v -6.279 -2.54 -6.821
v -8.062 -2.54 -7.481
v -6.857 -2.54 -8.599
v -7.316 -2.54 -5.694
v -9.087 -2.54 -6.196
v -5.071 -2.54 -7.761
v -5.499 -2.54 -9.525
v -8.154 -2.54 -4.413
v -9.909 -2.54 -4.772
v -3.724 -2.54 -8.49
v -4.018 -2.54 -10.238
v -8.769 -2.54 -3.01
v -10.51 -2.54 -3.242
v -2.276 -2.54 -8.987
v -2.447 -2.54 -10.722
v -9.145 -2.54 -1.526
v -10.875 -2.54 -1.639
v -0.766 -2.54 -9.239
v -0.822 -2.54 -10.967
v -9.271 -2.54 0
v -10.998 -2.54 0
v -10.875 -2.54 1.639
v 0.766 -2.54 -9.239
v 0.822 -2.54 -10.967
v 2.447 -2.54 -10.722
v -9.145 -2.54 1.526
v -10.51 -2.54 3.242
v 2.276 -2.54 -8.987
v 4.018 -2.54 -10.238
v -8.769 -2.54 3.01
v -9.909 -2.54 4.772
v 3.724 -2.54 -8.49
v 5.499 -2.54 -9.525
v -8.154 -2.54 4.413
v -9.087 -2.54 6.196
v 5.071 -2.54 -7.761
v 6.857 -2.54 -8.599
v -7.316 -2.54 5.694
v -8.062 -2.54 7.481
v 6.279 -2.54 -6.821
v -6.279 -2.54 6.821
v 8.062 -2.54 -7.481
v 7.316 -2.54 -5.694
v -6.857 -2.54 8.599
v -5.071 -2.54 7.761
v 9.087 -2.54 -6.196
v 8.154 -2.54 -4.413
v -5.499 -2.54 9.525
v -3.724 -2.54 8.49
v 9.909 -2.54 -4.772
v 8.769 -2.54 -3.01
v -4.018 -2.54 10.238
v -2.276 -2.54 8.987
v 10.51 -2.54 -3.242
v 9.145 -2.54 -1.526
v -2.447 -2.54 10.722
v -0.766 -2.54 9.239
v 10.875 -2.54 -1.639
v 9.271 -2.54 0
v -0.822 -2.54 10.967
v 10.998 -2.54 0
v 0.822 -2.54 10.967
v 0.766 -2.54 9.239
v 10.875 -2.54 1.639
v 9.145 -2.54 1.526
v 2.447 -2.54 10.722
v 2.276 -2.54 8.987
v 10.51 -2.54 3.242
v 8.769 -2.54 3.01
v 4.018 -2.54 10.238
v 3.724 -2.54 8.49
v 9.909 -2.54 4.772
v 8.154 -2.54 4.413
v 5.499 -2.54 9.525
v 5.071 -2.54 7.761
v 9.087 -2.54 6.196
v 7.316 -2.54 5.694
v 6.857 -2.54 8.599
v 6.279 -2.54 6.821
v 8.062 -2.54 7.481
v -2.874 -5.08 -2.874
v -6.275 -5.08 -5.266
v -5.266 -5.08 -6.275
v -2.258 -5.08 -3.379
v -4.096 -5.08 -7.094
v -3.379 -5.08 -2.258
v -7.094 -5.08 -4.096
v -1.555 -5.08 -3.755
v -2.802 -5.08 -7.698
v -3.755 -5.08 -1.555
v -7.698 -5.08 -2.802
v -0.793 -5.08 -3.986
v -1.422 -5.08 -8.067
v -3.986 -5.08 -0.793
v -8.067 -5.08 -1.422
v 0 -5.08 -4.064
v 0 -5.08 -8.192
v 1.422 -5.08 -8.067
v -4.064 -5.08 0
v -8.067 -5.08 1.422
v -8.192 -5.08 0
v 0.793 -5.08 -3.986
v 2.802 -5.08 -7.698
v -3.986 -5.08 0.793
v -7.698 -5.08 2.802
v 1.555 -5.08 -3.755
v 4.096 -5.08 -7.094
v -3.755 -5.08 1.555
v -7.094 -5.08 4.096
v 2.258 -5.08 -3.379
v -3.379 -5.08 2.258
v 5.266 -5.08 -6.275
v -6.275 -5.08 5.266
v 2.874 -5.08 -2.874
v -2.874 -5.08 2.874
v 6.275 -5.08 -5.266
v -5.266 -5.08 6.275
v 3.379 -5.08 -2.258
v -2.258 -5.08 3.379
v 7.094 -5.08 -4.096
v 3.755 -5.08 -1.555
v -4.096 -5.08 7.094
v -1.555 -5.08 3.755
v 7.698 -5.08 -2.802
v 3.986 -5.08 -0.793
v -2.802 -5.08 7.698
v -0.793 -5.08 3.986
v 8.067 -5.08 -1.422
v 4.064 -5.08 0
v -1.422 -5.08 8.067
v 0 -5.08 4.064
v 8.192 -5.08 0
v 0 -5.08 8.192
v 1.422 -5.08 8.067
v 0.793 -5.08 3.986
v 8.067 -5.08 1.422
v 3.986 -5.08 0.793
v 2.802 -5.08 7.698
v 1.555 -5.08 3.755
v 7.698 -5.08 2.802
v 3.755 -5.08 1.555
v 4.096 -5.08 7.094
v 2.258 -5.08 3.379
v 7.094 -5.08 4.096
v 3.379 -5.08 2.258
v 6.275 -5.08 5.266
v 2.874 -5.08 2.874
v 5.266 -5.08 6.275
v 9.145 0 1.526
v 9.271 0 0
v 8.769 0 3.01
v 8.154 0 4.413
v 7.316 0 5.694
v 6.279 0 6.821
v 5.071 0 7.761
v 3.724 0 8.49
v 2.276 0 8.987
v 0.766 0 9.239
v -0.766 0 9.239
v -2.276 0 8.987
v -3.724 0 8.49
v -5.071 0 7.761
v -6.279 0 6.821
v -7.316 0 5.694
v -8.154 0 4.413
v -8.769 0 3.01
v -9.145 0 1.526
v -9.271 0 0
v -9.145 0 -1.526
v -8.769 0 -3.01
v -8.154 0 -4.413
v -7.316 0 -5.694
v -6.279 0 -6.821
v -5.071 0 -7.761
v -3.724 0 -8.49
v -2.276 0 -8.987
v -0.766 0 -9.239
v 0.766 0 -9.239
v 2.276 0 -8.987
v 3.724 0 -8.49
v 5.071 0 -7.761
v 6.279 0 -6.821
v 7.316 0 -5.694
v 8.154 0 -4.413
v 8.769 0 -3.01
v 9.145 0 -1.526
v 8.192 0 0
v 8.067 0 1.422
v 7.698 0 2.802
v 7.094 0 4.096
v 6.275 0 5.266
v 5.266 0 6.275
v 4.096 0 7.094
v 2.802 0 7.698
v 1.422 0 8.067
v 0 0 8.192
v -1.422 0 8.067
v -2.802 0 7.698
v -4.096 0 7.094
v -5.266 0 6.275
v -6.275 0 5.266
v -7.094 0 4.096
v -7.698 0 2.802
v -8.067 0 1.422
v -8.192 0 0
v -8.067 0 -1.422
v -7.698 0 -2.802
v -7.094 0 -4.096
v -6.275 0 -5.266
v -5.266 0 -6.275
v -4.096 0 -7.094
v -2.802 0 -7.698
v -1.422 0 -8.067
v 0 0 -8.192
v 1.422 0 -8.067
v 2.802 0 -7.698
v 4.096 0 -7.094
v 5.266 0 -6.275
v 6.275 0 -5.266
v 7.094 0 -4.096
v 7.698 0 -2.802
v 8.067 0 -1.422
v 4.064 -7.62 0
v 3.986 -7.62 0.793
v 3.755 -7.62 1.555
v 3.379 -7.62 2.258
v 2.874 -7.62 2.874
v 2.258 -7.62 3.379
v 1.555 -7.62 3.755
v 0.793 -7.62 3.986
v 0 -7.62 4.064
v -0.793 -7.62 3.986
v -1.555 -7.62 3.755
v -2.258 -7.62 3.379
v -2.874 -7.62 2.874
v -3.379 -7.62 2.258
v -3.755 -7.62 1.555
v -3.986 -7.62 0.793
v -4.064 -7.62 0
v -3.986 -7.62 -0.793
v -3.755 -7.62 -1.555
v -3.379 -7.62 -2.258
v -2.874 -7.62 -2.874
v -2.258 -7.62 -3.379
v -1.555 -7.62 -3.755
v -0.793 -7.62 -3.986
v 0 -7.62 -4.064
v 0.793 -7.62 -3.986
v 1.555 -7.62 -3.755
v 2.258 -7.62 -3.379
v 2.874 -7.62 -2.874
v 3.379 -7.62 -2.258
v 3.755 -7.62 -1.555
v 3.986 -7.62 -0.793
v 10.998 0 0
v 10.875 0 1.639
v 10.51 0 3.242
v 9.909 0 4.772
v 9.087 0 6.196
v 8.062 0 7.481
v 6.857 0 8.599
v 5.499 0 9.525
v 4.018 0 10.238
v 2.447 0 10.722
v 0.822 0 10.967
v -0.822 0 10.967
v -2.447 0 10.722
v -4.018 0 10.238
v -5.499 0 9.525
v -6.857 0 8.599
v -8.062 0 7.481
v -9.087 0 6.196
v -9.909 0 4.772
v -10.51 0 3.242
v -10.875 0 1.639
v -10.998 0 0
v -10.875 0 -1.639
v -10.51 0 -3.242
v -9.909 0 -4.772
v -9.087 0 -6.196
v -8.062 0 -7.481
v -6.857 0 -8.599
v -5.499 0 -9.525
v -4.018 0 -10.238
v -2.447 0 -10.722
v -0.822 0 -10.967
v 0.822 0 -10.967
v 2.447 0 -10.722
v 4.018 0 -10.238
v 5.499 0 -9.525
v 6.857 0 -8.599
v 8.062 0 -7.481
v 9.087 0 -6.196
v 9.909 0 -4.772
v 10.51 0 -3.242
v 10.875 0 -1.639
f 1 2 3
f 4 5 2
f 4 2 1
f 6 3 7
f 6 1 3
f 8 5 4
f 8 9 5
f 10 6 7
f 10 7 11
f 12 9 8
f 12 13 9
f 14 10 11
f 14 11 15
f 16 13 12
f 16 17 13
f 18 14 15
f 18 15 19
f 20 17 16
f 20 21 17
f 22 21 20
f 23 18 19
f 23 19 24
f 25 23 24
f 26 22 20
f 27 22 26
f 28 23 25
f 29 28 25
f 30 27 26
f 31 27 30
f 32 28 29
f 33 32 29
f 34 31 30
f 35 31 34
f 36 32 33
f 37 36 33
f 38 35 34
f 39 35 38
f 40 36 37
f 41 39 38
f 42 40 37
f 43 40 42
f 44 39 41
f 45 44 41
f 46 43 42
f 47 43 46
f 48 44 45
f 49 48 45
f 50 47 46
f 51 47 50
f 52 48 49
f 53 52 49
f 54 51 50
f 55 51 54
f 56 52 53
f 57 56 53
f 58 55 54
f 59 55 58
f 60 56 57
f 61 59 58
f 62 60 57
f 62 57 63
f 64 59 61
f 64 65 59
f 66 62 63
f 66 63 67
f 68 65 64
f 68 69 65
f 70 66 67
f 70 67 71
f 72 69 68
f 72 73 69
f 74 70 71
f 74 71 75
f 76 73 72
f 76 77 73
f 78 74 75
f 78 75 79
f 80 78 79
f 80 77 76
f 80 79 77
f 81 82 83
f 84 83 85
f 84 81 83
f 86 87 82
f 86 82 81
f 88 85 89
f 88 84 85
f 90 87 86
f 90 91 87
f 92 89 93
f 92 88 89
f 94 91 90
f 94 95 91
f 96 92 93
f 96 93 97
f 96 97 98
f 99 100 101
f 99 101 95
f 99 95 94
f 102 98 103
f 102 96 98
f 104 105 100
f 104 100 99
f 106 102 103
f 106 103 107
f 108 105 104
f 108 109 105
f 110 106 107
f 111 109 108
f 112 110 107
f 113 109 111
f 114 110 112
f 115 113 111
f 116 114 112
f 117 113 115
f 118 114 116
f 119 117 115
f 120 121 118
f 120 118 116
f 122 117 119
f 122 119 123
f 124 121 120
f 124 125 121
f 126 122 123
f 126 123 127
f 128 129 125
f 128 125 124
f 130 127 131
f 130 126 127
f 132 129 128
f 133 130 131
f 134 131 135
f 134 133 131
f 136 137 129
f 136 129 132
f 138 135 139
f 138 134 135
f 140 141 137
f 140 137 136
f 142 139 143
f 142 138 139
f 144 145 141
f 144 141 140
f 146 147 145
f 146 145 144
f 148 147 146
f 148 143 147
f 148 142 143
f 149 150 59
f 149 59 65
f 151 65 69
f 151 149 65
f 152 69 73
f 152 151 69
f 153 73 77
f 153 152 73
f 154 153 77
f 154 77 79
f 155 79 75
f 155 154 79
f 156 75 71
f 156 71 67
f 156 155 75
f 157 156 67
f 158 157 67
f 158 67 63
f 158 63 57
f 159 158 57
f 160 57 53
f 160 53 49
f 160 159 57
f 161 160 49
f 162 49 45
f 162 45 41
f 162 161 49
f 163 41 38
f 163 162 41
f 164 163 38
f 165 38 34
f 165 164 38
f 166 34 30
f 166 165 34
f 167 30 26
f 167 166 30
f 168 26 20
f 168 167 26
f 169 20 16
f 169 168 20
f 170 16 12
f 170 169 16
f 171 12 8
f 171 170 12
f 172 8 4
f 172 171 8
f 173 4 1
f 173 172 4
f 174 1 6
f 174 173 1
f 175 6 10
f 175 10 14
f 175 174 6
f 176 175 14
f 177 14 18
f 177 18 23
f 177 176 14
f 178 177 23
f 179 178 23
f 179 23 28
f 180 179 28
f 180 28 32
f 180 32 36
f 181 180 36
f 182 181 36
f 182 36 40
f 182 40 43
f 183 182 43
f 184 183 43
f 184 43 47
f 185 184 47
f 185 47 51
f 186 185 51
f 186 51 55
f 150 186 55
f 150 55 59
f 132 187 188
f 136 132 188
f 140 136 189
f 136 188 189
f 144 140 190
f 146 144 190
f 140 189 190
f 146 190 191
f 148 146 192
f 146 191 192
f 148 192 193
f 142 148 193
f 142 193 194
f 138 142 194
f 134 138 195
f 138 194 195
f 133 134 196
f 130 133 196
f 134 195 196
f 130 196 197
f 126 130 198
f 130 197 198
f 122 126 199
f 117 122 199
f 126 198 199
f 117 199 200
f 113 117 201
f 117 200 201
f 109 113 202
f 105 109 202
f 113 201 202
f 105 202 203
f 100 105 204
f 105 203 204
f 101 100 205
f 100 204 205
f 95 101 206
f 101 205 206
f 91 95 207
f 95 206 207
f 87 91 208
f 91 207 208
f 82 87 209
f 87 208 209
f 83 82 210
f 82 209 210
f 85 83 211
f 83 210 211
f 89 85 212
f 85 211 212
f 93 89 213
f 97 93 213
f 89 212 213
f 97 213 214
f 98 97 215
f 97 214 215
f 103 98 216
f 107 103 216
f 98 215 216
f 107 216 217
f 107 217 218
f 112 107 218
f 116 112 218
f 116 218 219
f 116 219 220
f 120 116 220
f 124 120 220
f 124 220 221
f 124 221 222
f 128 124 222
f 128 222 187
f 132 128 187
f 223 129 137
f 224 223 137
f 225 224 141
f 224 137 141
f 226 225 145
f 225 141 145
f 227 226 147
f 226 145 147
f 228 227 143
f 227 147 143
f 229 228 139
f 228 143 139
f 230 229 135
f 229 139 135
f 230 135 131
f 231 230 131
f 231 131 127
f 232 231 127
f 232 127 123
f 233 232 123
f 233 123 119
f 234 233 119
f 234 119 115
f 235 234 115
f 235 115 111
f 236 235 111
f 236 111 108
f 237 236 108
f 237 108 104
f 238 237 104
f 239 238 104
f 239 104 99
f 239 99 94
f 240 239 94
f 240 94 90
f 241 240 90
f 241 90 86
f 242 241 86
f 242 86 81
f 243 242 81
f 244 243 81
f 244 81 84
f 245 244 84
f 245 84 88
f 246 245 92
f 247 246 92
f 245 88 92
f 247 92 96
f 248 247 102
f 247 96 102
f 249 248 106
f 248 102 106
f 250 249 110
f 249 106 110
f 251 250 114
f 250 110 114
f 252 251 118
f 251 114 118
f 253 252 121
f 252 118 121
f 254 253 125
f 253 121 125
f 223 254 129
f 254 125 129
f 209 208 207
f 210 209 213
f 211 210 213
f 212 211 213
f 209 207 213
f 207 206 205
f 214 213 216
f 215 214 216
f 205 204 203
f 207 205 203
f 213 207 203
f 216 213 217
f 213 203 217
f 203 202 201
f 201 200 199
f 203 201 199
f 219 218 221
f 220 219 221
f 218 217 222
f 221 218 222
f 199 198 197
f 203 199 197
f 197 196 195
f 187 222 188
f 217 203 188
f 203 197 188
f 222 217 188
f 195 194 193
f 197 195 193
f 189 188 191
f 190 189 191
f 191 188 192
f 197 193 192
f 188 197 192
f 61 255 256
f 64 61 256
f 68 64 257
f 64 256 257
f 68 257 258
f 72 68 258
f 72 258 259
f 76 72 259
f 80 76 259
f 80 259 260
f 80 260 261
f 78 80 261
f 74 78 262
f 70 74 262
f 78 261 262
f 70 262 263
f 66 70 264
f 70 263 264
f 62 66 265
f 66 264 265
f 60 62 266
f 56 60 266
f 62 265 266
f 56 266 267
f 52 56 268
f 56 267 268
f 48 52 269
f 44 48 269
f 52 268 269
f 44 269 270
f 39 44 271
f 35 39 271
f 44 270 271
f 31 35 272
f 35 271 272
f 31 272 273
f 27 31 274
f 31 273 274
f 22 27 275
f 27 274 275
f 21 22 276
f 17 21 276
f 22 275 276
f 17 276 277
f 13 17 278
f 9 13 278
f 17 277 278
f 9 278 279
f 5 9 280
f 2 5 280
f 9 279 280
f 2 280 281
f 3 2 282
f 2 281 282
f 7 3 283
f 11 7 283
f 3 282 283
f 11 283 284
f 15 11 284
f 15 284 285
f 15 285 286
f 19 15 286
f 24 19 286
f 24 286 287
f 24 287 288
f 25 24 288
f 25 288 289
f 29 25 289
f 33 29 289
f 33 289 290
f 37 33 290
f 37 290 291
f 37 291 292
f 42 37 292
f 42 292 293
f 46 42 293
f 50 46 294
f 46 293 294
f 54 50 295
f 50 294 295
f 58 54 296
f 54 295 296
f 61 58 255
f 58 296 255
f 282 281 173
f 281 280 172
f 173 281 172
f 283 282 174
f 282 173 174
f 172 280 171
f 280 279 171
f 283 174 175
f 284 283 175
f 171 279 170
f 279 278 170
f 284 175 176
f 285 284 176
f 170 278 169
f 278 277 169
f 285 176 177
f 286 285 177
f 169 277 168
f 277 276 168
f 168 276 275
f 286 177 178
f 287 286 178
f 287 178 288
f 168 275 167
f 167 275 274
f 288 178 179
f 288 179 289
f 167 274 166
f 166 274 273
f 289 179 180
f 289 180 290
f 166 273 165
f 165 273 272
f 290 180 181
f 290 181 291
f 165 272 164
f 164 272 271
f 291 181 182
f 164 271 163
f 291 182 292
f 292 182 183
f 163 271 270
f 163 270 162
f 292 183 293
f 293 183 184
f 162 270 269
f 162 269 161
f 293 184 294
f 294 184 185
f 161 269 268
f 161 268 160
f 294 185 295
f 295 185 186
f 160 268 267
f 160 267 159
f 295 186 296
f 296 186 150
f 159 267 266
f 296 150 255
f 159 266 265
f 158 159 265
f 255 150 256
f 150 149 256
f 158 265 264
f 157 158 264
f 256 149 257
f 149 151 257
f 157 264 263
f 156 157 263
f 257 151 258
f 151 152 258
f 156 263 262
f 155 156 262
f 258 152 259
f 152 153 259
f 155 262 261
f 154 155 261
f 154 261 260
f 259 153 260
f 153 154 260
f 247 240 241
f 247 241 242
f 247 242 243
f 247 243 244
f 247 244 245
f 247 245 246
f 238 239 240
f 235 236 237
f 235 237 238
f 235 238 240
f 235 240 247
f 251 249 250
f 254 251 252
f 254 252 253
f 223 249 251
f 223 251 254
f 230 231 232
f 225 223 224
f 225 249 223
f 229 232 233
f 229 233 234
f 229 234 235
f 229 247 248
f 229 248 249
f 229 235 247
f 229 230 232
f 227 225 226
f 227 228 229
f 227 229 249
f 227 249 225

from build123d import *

# Parameters (mm, degrees)
F1_R     = 4.064
F2_DEPTH = 7.62
F3_R     = 8.191674
F4_DEPTH = 5.08
F0_R     = 10.9982
F0_R_2   = 9.271
F5_DEPTH = 2.54


with BuildPart() as f2:
    # F1 (on Front) → F2 (new body)
    with BuildSketch(Plane.XZ):
        Circle(F1_R)
    extrude(amount=F2_DEPTH)

    # F3 (on Front) → F4 (join)
    with BuildSketch(Plane.XZ):
        Circle(F3_R)
    extrude(amount=F4_DEPTH)


with BuildPart() as f5:
    # F0 (on Front) → F5 (new body)
    with BuildSketch(Plane.XZ):
        Circle(F0_R)
        Circle(F0_R_2, mode=Mode.SUBTRACT)
    extrude(amount=F5_DEPTH)


solid = Compound([f2.part, f5.part])
